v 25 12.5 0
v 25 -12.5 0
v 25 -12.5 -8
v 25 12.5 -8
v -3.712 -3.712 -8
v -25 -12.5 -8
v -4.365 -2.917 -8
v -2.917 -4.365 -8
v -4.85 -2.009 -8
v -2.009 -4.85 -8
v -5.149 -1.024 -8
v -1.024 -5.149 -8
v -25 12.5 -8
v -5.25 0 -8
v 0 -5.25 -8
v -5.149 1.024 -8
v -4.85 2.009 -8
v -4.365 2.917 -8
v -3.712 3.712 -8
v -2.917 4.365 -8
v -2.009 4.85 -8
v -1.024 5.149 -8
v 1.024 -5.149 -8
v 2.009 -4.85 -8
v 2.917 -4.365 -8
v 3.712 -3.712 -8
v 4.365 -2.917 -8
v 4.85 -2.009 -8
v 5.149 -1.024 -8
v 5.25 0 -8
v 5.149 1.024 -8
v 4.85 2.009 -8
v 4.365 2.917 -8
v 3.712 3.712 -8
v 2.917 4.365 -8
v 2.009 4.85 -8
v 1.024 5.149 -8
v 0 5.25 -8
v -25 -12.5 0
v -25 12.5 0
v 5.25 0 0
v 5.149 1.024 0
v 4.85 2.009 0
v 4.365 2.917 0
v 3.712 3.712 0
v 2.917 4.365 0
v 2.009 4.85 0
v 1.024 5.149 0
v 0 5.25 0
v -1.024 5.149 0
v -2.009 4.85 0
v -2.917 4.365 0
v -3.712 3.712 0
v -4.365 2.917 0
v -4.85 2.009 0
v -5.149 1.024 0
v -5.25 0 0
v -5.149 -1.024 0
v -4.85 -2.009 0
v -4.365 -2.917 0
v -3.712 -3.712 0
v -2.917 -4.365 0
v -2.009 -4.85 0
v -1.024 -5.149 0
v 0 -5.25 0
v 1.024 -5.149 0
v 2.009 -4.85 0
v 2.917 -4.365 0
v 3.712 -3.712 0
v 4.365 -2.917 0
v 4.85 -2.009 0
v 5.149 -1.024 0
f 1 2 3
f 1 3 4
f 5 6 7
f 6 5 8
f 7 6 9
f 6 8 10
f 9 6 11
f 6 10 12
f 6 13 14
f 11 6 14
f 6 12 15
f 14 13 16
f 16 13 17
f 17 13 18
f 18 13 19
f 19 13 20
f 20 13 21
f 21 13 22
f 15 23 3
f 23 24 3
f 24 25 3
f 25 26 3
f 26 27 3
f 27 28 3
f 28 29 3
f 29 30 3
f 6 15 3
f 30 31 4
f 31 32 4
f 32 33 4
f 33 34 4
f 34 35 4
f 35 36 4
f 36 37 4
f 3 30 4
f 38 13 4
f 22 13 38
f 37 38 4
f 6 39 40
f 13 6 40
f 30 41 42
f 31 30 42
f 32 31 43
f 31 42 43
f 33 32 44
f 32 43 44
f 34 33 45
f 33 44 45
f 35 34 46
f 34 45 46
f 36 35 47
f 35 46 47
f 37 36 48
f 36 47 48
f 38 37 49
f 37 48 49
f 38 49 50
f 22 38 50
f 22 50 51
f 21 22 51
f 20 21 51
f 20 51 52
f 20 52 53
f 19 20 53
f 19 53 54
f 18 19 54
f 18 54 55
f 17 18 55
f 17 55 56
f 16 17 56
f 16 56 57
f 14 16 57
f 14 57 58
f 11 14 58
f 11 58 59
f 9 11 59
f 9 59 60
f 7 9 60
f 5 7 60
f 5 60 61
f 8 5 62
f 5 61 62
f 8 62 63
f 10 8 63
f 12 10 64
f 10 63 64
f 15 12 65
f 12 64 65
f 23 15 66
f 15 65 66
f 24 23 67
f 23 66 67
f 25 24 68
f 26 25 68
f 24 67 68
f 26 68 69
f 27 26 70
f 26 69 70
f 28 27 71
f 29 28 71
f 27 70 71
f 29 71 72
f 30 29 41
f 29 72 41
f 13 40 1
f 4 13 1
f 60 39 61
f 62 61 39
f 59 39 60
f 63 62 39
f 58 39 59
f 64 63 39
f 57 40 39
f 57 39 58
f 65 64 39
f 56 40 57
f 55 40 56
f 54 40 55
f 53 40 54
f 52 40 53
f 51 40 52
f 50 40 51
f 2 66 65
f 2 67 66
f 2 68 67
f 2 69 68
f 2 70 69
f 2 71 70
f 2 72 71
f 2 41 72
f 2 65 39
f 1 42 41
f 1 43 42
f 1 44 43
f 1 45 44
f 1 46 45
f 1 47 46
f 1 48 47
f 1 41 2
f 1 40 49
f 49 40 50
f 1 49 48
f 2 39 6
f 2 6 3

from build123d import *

# Parameters (mm, degrees)
F0_W     = 50
F0_H     = 25
F1_DEPTH = 8
F2_R     = 5.25
F3_DEPTH = 8.001


with BuildPart() as f1:
    # F0 (on Top) → F1 (new body)
    with BuildSketch(Plane.XY):
        Rectangle(F0_W, F0_H)
    extrude(amount=-F1_DEPTH)

    # F2 (on face) → F3 (cut, through all)
    with BuildSketch(Plane.XY):
        Circle(F2_R)
    extrude(amount=-F3_DEPTH, mode=Mode.SUBTRACT)


solid = f1.part
